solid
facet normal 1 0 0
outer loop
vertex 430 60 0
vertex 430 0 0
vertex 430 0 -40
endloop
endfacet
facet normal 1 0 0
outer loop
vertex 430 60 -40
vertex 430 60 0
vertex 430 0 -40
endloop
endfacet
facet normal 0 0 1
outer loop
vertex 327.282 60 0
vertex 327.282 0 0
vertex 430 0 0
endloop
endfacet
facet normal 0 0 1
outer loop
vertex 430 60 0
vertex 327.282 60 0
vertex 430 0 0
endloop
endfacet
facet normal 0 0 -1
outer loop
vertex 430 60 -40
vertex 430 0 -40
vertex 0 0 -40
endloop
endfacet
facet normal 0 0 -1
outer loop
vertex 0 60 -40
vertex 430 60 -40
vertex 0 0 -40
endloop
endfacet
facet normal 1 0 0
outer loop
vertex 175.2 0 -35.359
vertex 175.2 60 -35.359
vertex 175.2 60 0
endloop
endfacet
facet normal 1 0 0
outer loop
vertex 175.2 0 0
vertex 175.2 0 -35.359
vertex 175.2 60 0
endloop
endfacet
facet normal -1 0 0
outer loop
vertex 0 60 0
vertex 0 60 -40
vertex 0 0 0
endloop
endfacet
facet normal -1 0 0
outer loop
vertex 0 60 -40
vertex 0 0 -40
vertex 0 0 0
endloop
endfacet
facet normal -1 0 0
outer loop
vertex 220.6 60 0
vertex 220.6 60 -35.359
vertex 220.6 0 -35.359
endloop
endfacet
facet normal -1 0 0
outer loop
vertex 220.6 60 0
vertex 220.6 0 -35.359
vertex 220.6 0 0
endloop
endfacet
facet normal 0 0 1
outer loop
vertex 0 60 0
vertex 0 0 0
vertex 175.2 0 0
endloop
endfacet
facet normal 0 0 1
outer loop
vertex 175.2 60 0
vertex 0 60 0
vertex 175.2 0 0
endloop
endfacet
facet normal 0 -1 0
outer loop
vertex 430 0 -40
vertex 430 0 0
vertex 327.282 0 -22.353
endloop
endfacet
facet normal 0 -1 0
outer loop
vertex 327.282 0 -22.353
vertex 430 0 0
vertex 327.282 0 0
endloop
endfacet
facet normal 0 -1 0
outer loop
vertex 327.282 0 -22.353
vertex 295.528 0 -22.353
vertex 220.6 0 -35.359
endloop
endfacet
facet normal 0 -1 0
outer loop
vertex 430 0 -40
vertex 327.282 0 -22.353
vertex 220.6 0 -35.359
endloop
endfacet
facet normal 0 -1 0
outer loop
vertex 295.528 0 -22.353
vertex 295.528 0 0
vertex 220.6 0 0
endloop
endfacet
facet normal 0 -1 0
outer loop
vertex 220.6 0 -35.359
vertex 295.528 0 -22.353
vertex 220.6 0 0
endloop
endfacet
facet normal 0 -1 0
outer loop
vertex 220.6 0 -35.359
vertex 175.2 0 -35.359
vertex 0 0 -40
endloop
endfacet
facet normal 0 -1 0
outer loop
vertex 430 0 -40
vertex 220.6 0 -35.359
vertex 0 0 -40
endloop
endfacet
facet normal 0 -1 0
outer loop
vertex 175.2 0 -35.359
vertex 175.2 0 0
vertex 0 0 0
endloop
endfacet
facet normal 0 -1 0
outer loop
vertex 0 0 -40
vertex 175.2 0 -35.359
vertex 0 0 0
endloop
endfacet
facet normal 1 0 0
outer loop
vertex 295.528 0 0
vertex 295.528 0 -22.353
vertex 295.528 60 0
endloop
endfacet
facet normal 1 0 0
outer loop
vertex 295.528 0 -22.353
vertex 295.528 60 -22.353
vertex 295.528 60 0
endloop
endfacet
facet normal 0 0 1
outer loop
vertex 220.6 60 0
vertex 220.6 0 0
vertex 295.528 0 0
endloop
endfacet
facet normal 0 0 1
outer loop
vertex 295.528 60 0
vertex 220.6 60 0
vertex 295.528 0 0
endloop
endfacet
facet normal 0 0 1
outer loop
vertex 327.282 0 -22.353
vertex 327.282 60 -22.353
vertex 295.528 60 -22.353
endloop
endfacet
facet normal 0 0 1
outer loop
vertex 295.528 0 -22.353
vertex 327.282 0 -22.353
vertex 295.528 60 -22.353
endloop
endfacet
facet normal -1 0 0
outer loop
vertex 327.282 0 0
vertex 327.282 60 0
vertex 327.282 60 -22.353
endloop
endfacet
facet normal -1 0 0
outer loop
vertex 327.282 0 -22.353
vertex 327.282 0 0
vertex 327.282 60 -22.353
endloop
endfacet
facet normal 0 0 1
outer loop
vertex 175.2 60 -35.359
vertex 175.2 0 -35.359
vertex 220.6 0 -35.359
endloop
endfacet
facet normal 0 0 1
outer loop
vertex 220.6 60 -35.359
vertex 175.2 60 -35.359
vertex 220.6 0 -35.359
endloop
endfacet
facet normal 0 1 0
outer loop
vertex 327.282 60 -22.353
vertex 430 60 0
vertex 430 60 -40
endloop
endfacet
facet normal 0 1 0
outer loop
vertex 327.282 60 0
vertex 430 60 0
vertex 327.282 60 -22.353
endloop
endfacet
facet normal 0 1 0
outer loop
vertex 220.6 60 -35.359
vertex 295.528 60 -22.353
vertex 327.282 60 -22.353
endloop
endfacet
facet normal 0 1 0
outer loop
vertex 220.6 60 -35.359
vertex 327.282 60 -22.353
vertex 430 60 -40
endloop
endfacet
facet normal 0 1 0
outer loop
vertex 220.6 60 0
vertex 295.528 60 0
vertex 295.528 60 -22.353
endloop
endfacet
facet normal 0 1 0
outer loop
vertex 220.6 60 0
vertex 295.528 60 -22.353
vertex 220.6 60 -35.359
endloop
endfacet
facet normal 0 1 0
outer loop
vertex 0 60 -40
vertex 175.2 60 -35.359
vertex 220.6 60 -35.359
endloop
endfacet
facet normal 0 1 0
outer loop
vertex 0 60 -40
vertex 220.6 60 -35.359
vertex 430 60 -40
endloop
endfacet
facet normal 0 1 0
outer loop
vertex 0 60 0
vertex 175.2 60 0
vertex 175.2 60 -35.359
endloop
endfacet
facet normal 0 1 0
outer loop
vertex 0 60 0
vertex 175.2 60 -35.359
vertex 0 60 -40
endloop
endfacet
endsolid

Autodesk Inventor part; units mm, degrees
ref_plane "YZ Plane" through (0, 0, 0) normal (1, 0, 0) x (0, 1, 0)
ref_plane "XZ Plane" through (0, 0, 0) normal (0, 1, 0) x (-1, 0, 0)
ref_plane "XY Plane" through (0, 0, 0) normal (0, 0, 1) x (1, 0, 0)
sketch "Sketch1" plane through (0, 0, 0) normal (0, 1, 0) x (-1, 0, 0)
  line L0 (0, 0) -> (-430, 0)
  line L1 (-430, 0) -> (-430, -40)
  line L2 (-430, -40) -> (0, -40)
  line L3 (0, -40) -> (0, 0)
  dimension "d0" = 430
  dimension "d1" = 40
extrude "Extrusion1" add sketch "Sketch1" along normal blind 60
sketch "Sketch2" plane through (0, 0, 0) normal (0, -1, 0) x (1, 0, 0)
  line L0 (430, 0) -> (430, -40)
  line L1 (430, -40) -> (0, -40)
  line L2 (361.5161, 0) -> (430, 0)
  line L3 (180.1999, -1.7586) -> (180.1999, -32.3586)
  line L4 (215.5999, -1.7586) -> (180.1999, -1.7586)
  line L5 (215.5999, -32.3586) -> (215.5999, -1.7586)
  line L6 (180.1999, -32.3586) -> (215.5999, -32.3586)
  line L7 (215.5999, -1.7586) -> (220.5999, -1.7586)
  line L8 (180.1999, -1.7586) -> (175.1999, -1.7586)
  line L9 (175.1999, -1.7586) -> (175.1999, 0)
  line L10 (430, -40) -> (0, -40) projected
  line L11 (220.5999, -1.7586) -> (220.5999, 0)
  line L12 (215.5999, -32.3586) -> (215.5999, -35.3586)
  line L13 (215.5999, -32.3586) -> (212.5999, -32.3586) construction
  line L14 (220.5999, 0) -> (175.1999, 0)
  line L15 (175.1999, 0) -> (175.1999, -35.3586)
  line L16 (175.1999, -35.3586) -> (220.5999, -35.3586)
  line L17 (220.5999, -35.3586) -> (220.5999, 0)
  point P0 (0, 0)
  point P1 (430, -40)
  dimension "d4" = 5
  dimension "d5" = 5
  dimension "d7" = 3
  dimension "d8" = 90
extrude "Extrusion2" cut sketch "Sketch2" against normal blind 60
sketch "Sketch4" plane through (0, 60, 0) normal (0, 1, 0) x (1, 0, 0)
  line L0 (220.5999, 0) -> (430, 0)
  line L1 (430, 40) -> (0, 40)
  line L2 (220.5999, 35.3586) -> (220.5999, 0)
  line L3 (175.1999, 0) -> (175.1999, 35.3586)
  line L4 (175.1999, 35.3586) -> (220.5999, 35.3586)
  line L5 (0, 0) -> (175.1999, 0)
  line L6 (300.8442, 17.7835) -> (300.8442, 2.5435)
  line L7 (321.1642, 2.5435) -> (321.1642, 17.7835)
  line L8 (300.8442, 2.5435) -> (321.1642, 2.5435)
  line L9 (321.1642, 17.7835) -> (300.8442, 17.7835)
  line L10 (220.5999, 0) -> (430, 0) projected
  line L11 (295.5283, 0) -> (327.2819, 0)
  line L12 (327.2819, 0) -> (327.2819, 22.353)
  line L13 (327.2819, 22.353) -> (295.5283, 22.353)
  line L14 (295.5283, 22.353) -> (295.5283, 0)
extrude "Extrusion3" cut sketch "Sketch4" against normal blind 60 contours L14 L13 L12 L0 | L9 L7 L8 L6
properties part number "Cadru_2"
